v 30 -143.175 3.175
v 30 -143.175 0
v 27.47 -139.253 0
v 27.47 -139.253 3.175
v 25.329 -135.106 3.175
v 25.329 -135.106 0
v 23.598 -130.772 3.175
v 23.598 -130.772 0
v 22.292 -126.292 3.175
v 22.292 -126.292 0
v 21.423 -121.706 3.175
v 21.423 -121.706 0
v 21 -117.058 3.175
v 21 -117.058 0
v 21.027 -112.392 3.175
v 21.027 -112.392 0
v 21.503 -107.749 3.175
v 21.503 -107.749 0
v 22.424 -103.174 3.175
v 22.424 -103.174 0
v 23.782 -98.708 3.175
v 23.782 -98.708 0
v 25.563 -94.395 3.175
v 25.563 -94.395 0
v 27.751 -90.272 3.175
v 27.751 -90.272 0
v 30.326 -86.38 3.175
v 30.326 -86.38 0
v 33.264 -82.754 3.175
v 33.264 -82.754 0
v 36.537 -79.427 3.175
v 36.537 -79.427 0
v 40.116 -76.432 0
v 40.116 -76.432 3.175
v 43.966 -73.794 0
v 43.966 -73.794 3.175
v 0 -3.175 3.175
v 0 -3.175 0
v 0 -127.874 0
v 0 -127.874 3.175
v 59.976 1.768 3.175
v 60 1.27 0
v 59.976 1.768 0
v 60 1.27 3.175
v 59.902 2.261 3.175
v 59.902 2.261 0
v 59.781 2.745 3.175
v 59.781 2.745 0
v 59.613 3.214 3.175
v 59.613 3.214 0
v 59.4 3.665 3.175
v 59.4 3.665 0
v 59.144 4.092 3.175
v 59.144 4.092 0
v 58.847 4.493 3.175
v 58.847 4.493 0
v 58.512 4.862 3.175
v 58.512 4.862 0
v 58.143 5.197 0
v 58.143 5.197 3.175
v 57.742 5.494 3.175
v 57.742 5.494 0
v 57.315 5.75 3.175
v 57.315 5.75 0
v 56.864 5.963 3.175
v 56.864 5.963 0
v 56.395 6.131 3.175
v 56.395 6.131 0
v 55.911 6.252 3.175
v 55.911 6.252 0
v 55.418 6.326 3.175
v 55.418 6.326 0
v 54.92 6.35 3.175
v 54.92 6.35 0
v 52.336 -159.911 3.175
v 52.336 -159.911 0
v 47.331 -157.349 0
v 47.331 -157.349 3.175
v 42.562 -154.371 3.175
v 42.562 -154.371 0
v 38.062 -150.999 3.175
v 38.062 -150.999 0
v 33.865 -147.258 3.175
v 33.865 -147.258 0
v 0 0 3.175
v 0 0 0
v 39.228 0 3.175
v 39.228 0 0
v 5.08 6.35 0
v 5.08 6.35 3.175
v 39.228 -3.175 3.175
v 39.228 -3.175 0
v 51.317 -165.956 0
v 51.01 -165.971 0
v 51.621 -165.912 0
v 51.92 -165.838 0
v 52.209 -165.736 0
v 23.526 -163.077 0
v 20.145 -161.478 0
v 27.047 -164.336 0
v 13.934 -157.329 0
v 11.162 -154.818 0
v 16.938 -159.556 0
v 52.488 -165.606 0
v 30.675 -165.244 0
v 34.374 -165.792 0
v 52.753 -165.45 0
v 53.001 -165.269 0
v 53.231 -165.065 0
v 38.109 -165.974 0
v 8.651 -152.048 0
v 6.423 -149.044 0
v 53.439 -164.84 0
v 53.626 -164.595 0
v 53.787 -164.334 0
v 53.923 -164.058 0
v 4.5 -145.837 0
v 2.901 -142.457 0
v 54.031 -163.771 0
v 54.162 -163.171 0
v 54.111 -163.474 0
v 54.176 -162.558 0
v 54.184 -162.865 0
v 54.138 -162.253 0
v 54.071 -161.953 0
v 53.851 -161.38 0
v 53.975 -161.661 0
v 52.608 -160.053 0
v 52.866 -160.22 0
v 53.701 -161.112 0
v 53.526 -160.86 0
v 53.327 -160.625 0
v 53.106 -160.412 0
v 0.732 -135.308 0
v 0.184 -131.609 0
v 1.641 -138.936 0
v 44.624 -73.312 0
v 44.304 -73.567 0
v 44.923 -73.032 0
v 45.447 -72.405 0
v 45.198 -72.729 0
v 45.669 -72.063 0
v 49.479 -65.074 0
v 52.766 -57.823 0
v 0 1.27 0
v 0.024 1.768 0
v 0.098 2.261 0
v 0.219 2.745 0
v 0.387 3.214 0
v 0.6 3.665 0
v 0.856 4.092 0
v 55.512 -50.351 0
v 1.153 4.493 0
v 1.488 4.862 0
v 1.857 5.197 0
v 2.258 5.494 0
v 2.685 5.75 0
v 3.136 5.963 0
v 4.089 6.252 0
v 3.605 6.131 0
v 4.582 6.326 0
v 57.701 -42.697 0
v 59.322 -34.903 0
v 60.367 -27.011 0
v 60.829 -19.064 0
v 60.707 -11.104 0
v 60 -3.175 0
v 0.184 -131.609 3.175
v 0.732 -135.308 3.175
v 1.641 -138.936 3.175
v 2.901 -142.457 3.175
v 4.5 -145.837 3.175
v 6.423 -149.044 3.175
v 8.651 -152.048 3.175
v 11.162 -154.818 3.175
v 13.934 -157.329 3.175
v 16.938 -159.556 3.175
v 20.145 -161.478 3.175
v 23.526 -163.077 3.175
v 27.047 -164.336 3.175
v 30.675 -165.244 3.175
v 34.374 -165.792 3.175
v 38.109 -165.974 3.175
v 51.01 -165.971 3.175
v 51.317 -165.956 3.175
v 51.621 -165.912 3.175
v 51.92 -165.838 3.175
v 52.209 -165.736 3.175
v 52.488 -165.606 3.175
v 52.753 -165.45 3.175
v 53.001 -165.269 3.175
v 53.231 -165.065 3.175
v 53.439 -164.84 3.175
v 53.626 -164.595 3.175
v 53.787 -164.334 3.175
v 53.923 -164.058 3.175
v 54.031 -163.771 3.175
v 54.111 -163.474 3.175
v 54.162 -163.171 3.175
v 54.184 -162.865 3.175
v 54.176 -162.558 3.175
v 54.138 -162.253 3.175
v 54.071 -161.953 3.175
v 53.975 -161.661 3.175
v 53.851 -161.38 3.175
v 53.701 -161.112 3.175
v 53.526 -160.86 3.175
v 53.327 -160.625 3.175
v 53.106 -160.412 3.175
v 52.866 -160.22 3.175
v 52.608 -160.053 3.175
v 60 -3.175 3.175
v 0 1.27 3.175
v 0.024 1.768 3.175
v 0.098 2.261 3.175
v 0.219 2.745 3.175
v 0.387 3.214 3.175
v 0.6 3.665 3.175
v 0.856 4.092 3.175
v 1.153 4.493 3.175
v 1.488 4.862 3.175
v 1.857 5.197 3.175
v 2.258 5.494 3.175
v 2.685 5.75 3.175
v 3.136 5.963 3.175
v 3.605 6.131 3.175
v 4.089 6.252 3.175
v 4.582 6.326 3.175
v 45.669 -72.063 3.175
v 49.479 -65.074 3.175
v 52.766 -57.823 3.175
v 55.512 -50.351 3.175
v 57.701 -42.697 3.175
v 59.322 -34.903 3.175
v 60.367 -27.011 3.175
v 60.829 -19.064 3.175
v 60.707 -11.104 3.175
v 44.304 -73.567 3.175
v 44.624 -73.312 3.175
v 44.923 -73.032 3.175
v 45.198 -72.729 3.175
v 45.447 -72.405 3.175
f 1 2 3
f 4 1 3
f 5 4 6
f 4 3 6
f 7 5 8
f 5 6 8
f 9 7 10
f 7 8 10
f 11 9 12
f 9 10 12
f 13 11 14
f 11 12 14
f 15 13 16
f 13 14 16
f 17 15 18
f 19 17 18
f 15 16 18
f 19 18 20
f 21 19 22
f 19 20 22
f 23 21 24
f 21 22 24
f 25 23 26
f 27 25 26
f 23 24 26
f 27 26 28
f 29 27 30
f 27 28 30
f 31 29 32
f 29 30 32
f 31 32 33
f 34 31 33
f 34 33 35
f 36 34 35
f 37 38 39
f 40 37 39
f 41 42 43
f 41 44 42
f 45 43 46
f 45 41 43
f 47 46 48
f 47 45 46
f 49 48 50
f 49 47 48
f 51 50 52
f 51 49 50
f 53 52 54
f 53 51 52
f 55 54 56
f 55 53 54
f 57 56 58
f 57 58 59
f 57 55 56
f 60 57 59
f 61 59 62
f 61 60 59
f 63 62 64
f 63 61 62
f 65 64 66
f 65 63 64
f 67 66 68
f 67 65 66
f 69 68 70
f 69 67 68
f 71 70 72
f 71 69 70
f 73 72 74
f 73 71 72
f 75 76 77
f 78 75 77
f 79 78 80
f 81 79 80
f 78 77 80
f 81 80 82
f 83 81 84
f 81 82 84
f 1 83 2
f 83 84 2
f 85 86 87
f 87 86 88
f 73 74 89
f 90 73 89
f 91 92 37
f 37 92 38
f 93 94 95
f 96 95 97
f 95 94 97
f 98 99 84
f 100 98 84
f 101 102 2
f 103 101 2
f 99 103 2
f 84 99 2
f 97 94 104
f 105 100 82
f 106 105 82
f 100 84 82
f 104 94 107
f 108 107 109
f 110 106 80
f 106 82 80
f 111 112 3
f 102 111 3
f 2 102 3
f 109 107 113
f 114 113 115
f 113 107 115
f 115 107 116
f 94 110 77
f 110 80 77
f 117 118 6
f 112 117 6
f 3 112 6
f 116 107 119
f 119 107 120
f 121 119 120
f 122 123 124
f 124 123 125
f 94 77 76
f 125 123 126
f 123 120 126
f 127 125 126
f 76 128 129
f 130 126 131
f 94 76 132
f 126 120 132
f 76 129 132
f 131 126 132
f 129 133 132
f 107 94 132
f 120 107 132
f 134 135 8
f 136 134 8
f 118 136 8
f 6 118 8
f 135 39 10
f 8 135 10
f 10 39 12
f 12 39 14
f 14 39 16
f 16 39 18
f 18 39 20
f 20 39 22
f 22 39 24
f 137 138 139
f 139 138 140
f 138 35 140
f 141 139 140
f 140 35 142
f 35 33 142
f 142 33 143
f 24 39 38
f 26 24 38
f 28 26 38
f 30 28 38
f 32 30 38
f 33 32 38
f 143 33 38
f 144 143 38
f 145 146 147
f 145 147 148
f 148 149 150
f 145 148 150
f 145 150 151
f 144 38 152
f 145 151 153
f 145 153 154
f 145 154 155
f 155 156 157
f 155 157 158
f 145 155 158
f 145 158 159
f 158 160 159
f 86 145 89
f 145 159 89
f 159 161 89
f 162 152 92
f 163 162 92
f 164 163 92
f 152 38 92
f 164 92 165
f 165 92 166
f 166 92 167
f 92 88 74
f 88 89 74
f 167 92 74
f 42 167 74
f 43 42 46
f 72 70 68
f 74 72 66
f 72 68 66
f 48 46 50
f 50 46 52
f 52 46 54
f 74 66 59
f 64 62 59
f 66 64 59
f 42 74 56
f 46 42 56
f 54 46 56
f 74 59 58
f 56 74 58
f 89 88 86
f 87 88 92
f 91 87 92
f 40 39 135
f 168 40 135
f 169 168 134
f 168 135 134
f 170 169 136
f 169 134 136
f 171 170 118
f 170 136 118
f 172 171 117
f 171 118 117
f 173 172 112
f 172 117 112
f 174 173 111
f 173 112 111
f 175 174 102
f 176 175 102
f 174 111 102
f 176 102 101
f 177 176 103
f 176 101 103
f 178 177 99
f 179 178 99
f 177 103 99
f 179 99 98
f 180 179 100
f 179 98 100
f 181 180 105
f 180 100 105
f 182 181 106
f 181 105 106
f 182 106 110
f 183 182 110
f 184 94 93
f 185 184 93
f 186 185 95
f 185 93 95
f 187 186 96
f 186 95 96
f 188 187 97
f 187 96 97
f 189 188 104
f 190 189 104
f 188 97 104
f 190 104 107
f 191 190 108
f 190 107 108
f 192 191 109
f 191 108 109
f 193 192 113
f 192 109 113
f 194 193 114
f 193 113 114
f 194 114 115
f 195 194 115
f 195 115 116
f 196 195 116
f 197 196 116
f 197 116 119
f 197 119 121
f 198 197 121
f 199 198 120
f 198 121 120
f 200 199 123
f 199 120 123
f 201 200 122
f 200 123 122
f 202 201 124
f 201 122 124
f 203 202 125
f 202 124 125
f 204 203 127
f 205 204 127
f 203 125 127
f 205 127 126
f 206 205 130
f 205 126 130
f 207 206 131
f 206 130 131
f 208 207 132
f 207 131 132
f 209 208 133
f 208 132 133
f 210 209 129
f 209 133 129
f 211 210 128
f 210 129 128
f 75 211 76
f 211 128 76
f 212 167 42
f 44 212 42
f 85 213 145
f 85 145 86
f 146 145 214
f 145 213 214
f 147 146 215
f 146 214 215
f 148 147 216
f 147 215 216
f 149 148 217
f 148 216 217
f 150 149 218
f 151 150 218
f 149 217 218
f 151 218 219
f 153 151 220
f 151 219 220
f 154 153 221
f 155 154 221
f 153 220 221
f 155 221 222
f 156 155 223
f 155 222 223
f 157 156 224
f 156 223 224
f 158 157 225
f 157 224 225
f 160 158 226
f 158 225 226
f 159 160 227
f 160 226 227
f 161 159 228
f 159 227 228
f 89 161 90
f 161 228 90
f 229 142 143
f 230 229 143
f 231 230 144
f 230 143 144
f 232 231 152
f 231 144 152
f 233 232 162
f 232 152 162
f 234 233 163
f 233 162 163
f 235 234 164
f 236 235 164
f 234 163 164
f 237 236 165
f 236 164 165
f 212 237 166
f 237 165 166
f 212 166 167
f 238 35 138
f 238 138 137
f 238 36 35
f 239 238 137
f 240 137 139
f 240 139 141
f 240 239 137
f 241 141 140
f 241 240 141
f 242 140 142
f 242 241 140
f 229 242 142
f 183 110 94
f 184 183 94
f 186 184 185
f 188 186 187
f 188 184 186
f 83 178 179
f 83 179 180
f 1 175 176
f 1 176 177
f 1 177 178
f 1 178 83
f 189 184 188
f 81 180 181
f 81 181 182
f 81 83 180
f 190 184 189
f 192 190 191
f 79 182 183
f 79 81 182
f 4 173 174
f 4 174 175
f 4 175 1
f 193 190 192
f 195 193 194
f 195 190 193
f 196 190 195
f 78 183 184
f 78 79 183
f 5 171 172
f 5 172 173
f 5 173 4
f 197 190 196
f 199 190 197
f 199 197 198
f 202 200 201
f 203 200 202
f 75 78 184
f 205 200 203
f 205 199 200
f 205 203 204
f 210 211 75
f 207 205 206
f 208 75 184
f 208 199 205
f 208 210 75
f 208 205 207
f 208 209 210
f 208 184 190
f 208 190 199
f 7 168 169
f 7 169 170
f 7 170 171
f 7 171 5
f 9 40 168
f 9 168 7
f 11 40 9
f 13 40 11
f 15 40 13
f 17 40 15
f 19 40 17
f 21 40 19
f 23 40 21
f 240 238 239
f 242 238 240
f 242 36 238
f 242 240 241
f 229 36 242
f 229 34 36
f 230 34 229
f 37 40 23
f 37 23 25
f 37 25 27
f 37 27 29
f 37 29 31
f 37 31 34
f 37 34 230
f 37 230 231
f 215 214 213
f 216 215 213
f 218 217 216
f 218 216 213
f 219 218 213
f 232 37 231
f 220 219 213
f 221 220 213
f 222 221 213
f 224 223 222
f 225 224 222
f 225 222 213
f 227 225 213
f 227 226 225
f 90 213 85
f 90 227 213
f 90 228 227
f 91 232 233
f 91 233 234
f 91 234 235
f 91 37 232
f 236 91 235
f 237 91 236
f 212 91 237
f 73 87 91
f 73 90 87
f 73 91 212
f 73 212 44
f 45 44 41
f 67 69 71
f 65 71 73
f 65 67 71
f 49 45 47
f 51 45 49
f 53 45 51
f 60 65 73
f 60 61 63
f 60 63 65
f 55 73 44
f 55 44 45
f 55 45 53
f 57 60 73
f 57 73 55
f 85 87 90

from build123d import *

# Parameters (mm, degrees)
F1_DEPTH = 3.175
F2_R     = 5.08


# Not quite as in the source:
# - a length typed as a fraction of an inch, garbled in the dataset ("3 / 203.2 mm" for 3/8 in), is restored


with BuildPart() as f1:
    # F0 (on Top) → F1 (new body)
    with BuildSketch(Plane.XY):
        with BuildLine():
            Line((0, 6.35), (0, 0))
            Line((0, 0), (39.228014, 0))
            Line((39.228014, 0), (39.228014, -3.175))
            Line((39.228014, -3.175), (0, -3.175))
            Line((0, -3.175), (0, -30.5298216847))
            Line((0, -30.5298216847), (0, -127.8741553825))
            ThreePointArc((0, -127.8741553825), (11.1624656807, -154.8181574015), (38.1091467085, -165.9741542846))
            Line((38.1091467085, -165.9741542846), (51.0104592901, -165.9710570523))
            ThreePointArc((51.0104592901, -165.9710570523), (54.1114045686, -163.4743163552), (52.3355938941, -159.9111615484))
            ThreePointArc((52.3355938941, -159.9111615484), (40.2763953072, -152.7327194477), (30, -143.175))
            ThreePointArc((30, -143.175), (22.0311793243, -104.8602527123), (45, -73.175))
            ThreePointArc((45, -73.175), (58.4492609505, -39.4498416322), (60, -3.175))
            Line((60, -3.175), (60, 0))
            Line((60, 0), (60, 6.35))
            Line((60, 6.35), (39.228014, 6.35))
            Line((39.228014, 6.35), (0, 6.35))
        make_face()
    extrude(amount=F1_DEPTH)

    # F2
    f2_edges = [f1.edges().sort_by_distance(p)[0] for p in [
        (60, 6.35, 1.5875),
        (0, 6.35, 1.5875),
        (45, -73.175, 1.5875),
    ]]
    fillet(f2_edges, radius=F2_R)


solid = f1.part
